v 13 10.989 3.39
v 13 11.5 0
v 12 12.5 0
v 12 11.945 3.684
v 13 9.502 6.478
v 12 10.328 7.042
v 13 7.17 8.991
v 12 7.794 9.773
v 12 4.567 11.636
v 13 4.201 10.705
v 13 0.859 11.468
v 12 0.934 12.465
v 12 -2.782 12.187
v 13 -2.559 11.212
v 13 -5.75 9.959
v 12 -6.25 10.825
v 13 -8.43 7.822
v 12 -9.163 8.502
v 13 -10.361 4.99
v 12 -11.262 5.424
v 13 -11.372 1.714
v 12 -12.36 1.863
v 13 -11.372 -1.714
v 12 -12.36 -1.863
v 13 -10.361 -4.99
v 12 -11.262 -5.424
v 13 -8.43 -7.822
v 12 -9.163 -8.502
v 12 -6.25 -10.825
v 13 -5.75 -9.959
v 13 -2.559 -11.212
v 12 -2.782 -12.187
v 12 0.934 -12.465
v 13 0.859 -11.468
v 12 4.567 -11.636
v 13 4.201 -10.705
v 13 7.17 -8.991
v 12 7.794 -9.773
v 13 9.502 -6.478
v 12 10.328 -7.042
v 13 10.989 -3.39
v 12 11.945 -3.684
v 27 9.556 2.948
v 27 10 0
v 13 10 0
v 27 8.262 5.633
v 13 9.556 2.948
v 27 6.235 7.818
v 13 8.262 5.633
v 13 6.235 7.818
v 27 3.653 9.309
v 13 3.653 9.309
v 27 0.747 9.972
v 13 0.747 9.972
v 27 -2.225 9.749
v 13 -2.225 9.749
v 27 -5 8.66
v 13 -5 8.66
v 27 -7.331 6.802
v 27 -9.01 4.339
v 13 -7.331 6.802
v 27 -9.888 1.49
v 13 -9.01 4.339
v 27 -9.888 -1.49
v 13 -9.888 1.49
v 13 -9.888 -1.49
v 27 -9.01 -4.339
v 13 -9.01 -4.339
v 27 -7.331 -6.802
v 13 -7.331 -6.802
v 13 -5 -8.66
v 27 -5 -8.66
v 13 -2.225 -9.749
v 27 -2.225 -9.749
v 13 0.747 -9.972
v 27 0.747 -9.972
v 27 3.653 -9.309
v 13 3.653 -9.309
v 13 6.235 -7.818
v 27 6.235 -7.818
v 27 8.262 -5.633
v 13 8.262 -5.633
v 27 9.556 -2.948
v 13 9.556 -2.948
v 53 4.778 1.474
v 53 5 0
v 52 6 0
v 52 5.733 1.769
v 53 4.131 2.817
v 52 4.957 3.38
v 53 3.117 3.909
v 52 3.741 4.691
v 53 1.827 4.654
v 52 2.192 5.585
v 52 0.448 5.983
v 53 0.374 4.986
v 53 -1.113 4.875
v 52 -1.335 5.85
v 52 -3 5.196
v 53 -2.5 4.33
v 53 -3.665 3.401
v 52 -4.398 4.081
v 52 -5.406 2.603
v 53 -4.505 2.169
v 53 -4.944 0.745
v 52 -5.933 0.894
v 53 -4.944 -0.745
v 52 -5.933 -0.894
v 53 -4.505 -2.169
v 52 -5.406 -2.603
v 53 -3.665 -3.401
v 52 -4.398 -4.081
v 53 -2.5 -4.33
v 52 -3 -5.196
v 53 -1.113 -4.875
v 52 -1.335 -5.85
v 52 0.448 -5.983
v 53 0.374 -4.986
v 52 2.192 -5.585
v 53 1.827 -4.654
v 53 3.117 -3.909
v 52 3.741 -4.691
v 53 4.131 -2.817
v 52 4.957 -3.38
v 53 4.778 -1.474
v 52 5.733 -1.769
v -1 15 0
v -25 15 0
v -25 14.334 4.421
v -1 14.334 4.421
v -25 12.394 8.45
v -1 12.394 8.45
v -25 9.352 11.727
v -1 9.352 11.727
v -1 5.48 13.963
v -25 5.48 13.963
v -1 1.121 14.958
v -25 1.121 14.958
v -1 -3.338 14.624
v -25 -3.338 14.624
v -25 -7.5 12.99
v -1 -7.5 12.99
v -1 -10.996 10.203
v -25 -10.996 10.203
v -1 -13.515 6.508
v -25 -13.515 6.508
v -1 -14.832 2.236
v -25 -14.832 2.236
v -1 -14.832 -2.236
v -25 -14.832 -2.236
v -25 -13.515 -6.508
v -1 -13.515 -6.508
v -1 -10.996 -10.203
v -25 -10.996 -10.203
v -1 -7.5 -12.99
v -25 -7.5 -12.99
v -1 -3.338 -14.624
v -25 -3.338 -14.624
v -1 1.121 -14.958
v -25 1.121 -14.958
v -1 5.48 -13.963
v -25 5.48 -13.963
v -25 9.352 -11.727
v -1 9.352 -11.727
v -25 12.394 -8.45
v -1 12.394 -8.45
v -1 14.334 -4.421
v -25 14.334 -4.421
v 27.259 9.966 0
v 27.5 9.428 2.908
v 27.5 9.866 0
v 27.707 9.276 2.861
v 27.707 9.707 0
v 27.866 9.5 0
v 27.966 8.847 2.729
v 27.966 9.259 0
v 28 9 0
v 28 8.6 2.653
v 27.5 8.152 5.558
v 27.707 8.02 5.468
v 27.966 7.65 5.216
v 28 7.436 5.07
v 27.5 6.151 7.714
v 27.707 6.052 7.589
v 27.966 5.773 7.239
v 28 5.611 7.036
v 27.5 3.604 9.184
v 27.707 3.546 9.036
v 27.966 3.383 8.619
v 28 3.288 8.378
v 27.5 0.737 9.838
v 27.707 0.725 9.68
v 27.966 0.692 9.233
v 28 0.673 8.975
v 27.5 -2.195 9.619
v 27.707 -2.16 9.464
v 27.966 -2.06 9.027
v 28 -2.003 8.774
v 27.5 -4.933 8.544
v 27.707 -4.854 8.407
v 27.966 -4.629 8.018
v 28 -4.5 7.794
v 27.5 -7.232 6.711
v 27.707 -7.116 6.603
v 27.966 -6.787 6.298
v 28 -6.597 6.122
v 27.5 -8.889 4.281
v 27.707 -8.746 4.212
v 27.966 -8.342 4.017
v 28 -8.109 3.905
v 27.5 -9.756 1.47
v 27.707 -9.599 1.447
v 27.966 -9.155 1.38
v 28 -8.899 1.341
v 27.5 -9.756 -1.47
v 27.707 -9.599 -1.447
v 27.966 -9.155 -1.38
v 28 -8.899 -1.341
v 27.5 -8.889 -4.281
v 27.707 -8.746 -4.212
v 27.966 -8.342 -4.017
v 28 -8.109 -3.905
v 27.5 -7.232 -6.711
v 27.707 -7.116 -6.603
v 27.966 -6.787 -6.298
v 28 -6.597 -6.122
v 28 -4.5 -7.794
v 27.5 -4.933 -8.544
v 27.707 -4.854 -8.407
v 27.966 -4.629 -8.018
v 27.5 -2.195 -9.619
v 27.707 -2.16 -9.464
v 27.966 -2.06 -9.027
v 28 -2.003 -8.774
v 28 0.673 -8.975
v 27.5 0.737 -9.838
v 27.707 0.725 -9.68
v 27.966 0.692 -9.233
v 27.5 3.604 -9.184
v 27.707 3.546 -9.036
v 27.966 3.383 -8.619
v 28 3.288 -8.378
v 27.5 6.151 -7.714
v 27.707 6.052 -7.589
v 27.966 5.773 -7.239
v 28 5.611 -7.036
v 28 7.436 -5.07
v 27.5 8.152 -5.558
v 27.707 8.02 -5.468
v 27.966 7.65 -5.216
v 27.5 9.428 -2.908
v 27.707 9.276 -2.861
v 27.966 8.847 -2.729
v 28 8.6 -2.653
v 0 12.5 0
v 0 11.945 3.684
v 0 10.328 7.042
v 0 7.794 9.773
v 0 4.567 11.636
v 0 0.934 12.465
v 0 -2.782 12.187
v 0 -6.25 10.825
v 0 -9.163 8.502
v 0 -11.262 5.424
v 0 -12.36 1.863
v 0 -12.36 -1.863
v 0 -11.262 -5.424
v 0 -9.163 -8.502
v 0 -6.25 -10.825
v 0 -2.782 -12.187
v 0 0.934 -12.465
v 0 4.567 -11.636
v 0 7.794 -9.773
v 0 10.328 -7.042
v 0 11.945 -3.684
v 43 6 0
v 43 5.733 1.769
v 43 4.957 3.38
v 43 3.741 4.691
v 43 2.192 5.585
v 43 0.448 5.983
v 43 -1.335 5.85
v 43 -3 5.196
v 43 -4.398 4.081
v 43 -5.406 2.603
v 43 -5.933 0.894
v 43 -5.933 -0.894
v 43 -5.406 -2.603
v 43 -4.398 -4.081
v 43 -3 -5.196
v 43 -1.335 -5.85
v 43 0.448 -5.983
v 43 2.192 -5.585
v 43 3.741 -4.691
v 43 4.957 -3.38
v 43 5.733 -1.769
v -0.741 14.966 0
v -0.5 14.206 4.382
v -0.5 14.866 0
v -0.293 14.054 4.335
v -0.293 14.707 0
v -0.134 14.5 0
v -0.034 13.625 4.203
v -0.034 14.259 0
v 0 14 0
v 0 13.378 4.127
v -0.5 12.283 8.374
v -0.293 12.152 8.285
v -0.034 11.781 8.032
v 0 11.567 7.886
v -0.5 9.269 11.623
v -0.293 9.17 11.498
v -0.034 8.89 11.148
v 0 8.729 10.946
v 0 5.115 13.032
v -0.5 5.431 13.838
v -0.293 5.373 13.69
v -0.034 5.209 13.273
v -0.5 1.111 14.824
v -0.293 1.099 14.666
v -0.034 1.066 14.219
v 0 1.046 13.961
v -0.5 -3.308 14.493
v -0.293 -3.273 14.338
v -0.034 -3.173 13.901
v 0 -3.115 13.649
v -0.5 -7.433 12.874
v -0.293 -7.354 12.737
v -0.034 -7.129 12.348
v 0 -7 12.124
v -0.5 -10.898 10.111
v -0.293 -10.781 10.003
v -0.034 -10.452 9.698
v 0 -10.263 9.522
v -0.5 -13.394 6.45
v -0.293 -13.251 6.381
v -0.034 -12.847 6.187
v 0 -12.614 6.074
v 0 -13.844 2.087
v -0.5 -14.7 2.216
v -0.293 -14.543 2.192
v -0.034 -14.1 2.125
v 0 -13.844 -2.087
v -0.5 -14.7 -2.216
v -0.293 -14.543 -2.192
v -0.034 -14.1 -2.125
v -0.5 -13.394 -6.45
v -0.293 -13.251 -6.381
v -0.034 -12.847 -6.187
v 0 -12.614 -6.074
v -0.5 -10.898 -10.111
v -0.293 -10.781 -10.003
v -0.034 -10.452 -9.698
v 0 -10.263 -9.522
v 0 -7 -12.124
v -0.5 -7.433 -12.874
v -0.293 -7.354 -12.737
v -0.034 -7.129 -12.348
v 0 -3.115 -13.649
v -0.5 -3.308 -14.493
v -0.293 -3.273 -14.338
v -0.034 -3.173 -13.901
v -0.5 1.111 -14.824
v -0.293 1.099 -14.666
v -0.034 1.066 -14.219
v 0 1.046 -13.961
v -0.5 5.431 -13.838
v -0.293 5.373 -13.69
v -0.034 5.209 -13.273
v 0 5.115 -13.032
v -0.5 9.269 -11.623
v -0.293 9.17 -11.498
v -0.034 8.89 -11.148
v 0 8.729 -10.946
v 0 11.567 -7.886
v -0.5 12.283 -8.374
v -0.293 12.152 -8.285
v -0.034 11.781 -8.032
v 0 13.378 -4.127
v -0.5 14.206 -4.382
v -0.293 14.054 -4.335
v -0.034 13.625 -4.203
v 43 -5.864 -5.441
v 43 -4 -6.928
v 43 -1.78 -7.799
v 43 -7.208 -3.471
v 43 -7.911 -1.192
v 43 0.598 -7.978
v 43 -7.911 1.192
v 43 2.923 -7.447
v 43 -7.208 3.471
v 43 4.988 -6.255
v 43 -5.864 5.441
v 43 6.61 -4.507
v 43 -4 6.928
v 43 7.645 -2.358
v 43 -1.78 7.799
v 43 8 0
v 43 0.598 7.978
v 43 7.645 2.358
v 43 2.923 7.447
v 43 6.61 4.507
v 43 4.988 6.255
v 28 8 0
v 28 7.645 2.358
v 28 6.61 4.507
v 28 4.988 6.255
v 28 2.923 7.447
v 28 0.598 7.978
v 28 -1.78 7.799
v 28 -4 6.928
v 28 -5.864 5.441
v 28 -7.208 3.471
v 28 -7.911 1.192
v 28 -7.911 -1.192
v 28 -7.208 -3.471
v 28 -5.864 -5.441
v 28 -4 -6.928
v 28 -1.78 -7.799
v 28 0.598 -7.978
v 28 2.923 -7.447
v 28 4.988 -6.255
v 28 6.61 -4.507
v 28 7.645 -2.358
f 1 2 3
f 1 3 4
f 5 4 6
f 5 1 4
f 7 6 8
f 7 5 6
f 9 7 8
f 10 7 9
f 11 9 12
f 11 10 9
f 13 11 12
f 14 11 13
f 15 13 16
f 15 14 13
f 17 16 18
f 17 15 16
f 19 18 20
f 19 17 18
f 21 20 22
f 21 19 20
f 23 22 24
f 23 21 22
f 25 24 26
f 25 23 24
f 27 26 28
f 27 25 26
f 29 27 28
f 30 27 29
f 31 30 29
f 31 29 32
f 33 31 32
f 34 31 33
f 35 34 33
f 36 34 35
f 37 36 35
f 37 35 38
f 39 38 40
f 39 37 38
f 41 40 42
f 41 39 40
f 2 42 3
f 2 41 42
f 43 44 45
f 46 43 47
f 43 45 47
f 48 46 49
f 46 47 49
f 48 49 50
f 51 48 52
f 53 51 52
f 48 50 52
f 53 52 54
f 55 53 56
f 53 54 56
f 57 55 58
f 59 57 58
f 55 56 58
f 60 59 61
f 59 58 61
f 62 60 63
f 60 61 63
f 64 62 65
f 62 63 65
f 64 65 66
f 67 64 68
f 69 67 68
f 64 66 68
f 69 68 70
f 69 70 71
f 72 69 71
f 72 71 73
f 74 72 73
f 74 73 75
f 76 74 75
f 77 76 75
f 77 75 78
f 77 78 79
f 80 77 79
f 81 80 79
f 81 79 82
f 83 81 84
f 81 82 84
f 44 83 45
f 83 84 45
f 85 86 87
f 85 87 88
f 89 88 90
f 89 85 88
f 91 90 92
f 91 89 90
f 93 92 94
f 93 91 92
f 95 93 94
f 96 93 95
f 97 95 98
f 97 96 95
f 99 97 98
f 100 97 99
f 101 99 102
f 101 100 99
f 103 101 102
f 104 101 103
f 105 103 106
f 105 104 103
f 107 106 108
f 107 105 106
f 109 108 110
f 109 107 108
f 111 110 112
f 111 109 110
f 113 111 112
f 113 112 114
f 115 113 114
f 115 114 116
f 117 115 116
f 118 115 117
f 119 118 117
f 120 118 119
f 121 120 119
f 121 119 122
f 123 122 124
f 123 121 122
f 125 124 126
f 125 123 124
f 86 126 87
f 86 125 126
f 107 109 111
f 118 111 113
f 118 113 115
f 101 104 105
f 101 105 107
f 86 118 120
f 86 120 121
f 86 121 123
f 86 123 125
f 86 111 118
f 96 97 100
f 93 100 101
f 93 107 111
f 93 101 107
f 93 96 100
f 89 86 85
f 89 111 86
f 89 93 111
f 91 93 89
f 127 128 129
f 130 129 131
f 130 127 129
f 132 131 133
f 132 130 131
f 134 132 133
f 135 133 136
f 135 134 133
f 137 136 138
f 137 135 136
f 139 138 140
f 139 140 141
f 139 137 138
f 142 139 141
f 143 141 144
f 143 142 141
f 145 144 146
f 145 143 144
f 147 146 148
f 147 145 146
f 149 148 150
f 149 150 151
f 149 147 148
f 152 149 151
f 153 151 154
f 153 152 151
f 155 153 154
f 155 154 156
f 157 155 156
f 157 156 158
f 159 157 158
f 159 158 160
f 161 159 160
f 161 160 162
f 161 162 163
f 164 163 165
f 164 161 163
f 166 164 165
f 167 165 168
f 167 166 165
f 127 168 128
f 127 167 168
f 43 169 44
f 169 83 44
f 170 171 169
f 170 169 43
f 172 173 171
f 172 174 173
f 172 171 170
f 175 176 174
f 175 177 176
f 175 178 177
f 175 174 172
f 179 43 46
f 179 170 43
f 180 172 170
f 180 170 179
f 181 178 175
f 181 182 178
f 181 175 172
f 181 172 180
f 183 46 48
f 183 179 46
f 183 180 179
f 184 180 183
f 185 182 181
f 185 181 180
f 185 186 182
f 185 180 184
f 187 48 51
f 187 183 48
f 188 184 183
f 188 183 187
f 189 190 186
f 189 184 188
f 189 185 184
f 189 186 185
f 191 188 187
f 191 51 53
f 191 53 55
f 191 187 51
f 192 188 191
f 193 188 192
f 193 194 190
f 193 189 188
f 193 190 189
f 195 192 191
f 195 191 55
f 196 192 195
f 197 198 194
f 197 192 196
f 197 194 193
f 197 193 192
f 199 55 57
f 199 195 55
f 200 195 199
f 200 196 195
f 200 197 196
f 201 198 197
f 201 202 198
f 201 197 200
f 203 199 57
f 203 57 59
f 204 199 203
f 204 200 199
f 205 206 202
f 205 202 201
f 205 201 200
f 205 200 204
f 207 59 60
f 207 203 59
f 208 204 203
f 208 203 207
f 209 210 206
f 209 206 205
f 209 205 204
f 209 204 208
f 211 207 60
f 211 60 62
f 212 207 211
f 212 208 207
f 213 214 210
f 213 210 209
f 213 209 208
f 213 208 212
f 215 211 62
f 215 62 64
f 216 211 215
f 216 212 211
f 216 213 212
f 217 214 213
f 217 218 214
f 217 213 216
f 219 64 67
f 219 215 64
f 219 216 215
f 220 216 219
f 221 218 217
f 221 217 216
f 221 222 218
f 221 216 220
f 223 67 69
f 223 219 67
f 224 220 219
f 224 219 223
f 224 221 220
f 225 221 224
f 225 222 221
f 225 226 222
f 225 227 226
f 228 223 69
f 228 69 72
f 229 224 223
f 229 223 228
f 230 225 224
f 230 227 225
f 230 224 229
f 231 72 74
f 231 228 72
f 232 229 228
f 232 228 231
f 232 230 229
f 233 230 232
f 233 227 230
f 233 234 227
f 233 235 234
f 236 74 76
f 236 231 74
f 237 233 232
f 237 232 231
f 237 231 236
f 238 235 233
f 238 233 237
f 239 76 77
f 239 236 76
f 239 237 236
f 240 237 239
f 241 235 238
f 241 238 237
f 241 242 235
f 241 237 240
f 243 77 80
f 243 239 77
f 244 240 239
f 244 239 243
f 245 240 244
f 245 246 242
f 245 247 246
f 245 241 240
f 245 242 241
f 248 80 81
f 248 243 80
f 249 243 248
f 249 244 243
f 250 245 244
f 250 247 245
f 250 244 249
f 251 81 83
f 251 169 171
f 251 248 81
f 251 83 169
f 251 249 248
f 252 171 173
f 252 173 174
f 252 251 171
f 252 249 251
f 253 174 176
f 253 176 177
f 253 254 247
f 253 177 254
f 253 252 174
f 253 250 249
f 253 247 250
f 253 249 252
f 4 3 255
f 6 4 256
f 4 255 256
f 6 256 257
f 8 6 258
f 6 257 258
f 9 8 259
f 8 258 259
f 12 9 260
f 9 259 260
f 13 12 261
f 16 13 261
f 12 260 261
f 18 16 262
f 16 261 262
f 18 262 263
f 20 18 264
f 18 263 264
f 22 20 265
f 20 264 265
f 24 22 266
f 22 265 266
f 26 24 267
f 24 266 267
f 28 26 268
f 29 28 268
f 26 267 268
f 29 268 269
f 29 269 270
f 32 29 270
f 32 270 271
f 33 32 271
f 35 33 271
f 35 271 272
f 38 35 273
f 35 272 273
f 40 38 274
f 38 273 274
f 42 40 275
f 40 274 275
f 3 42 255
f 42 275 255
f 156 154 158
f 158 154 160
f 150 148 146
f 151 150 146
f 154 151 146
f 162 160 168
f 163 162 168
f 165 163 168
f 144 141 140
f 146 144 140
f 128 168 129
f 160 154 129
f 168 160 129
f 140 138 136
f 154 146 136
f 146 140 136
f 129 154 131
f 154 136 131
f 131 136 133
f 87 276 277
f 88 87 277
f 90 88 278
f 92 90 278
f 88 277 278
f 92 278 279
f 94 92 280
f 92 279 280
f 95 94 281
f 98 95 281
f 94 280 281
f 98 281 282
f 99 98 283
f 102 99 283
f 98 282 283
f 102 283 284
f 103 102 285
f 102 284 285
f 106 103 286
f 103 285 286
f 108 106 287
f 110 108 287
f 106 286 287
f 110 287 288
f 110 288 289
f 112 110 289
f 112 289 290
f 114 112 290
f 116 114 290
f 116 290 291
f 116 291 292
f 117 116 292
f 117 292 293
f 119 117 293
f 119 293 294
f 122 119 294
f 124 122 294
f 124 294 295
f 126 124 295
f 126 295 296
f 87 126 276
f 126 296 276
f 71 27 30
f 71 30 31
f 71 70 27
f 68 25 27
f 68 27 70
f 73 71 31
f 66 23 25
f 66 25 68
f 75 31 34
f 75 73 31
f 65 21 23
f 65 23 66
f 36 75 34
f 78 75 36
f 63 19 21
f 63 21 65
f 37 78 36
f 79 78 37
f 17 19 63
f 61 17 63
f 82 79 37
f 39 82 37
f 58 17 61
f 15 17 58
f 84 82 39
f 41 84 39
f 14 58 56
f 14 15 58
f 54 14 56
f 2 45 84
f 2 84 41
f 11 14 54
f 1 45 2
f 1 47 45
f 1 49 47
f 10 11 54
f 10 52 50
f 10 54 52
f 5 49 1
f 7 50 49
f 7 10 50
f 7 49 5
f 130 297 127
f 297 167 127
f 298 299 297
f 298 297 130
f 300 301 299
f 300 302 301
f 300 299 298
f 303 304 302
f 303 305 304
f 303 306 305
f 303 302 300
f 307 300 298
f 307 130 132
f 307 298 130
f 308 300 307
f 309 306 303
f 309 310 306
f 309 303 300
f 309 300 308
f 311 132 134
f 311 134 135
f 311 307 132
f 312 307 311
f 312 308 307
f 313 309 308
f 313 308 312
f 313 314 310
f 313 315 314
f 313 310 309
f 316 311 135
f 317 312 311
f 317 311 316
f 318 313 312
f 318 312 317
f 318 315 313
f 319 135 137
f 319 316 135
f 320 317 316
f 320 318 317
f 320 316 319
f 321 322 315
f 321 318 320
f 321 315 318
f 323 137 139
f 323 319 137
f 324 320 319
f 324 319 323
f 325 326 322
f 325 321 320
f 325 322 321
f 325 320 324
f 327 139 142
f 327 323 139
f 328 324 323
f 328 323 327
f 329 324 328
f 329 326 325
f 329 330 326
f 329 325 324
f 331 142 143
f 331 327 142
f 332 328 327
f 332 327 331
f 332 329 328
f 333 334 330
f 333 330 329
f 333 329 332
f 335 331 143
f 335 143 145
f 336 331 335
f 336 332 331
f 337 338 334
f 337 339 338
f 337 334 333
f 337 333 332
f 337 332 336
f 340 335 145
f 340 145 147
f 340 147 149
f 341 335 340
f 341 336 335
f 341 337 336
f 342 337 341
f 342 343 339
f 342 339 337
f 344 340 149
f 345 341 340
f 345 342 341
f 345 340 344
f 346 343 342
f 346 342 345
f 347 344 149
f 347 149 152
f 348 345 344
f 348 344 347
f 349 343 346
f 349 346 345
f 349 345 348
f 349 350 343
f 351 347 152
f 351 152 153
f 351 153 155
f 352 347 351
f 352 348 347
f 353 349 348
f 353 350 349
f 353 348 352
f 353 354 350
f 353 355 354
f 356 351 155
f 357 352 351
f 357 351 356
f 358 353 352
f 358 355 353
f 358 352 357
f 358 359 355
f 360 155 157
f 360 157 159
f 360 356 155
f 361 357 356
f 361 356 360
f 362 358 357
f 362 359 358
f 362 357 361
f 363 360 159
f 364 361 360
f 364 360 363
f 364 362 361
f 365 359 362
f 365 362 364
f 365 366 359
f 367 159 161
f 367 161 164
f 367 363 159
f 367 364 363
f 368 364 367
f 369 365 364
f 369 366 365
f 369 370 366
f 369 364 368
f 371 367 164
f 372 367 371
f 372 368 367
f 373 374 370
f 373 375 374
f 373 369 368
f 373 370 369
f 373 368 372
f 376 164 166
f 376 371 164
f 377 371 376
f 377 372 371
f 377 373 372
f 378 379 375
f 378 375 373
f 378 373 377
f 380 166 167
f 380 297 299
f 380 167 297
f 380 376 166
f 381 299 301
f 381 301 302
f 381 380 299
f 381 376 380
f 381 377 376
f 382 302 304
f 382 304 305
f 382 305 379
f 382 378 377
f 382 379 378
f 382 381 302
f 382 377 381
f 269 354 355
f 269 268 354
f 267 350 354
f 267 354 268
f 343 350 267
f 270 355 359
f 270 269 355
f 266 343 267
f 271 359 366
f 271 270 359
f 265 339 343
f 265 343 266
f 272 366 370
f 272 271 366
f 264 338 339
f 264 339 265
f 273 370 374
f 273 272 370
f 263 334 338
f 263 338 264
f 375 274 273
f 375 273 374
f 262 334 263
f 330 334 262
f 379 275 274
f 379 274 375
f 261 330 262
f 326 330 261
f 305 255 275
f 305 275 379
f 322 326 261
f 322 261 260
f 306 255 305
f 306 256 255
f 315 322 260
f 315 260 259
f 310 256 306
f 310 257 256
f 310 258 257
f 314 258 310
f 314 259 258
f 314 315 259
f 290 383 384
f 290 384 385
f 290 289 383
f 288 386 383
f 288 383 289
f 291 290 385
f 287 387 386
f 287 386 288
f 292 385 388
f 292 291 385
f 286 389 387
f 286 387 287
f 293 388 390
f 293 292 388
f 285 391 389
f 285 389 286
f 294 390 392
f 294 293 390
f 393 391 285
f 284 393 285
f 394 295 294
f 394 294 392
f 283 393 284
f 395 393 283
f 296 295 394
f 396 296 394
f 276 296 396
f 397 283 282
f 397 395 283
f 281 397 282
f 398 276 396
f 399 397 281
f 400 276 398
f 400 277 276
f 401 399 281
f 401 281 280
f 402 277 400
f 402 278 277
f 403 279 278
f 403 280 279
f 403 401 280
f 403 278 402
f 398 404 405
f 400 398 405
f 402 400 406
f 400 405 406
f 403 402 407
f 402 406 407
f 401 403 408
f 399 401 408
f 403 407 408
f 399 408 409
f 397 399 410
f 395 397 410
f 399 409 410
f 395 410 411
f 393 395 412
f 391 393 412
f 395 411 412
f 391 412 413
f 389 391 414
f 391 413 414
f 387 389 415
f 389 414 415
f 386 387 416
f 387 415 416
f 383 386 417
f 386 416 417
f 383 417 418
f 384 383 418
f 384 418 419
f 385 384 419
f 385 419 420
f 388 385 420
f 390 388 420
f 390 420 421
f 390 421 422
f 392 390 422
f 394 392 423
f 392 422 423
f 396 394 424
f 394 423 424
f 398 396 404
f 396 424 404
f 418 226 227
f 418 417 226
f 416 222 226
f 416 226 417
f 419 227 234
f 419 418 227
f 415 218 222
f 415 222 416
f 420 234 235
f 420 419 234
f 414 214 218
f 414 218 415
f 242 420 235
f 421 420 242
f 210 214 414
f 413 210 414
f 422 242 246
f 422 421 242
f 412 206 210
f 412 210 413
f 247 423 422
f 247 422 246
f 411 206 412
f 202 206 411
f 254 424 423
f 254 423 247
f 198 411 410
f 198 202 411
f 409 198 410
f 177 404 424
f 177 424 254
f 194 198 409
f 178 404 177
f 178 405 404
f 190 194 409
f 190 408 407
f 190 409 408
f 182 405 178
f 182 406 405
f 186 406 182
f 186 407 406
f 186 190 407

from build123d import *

# Parameters (mm, degrees)
F0_R     = 15
F1_DEPTH = 25
F2_R     = 12.5
F3_DEPTH = 13
F4_R     = 10
F5_DEPTH = 15
F6_R     = 8
F7_DEPTH = 15
F8_R     = 6
F9_DEPTH = 10
F10_R    = 1
F11_SIZE = 1


with BuildPart() as f1:
    # F0 (on Right) → F1 (new body)
    with BuildSketch(Plane.YZ):
        Circle(F0_R)
    extrude(amount=-F1_DEPTH)

    # F2 (on face) → F3 (join)
    with BuildSketch(Plane.YZ):
        Circle(F2_R)
    extrude(amount=F3_DEPTH)

    # F4 (on face) → F5 (join)
    with BuildSketch(Plane.YZ.offset(13)):
        Circle(F4_R)
    extrude(amount=F5_DEPTH)

    # F6 (on face) → F7 (join)
    with BuildSketch(Plane.YZ.offset(28)):
        Circle(F6_R)
    extrude(amount=F7_DEPTH)

    # F8 (on face) → F9 (join)
    with BuildSketch(Plane.YZ.offset(43)):
        Circle(F8_R)
    extrude(amount=F9_DEPTH)

    # F10
    f10_edges = [f1.edges().sort_by_distance(p)[0] for p in [
        (0, -15, 0),
        (28, -10, 0),
    ]]
    fillet(f10_edges, radius=F10_R)

    # F11
    f11_edges = [f1.edges().sort_by_distance(p)[0] for p in [
        (13, -12.5, 0),
        (53, -6, 0),
    ]]
    chamfer(f11_edges, length=F11_SIZE)


solid = f1.part
